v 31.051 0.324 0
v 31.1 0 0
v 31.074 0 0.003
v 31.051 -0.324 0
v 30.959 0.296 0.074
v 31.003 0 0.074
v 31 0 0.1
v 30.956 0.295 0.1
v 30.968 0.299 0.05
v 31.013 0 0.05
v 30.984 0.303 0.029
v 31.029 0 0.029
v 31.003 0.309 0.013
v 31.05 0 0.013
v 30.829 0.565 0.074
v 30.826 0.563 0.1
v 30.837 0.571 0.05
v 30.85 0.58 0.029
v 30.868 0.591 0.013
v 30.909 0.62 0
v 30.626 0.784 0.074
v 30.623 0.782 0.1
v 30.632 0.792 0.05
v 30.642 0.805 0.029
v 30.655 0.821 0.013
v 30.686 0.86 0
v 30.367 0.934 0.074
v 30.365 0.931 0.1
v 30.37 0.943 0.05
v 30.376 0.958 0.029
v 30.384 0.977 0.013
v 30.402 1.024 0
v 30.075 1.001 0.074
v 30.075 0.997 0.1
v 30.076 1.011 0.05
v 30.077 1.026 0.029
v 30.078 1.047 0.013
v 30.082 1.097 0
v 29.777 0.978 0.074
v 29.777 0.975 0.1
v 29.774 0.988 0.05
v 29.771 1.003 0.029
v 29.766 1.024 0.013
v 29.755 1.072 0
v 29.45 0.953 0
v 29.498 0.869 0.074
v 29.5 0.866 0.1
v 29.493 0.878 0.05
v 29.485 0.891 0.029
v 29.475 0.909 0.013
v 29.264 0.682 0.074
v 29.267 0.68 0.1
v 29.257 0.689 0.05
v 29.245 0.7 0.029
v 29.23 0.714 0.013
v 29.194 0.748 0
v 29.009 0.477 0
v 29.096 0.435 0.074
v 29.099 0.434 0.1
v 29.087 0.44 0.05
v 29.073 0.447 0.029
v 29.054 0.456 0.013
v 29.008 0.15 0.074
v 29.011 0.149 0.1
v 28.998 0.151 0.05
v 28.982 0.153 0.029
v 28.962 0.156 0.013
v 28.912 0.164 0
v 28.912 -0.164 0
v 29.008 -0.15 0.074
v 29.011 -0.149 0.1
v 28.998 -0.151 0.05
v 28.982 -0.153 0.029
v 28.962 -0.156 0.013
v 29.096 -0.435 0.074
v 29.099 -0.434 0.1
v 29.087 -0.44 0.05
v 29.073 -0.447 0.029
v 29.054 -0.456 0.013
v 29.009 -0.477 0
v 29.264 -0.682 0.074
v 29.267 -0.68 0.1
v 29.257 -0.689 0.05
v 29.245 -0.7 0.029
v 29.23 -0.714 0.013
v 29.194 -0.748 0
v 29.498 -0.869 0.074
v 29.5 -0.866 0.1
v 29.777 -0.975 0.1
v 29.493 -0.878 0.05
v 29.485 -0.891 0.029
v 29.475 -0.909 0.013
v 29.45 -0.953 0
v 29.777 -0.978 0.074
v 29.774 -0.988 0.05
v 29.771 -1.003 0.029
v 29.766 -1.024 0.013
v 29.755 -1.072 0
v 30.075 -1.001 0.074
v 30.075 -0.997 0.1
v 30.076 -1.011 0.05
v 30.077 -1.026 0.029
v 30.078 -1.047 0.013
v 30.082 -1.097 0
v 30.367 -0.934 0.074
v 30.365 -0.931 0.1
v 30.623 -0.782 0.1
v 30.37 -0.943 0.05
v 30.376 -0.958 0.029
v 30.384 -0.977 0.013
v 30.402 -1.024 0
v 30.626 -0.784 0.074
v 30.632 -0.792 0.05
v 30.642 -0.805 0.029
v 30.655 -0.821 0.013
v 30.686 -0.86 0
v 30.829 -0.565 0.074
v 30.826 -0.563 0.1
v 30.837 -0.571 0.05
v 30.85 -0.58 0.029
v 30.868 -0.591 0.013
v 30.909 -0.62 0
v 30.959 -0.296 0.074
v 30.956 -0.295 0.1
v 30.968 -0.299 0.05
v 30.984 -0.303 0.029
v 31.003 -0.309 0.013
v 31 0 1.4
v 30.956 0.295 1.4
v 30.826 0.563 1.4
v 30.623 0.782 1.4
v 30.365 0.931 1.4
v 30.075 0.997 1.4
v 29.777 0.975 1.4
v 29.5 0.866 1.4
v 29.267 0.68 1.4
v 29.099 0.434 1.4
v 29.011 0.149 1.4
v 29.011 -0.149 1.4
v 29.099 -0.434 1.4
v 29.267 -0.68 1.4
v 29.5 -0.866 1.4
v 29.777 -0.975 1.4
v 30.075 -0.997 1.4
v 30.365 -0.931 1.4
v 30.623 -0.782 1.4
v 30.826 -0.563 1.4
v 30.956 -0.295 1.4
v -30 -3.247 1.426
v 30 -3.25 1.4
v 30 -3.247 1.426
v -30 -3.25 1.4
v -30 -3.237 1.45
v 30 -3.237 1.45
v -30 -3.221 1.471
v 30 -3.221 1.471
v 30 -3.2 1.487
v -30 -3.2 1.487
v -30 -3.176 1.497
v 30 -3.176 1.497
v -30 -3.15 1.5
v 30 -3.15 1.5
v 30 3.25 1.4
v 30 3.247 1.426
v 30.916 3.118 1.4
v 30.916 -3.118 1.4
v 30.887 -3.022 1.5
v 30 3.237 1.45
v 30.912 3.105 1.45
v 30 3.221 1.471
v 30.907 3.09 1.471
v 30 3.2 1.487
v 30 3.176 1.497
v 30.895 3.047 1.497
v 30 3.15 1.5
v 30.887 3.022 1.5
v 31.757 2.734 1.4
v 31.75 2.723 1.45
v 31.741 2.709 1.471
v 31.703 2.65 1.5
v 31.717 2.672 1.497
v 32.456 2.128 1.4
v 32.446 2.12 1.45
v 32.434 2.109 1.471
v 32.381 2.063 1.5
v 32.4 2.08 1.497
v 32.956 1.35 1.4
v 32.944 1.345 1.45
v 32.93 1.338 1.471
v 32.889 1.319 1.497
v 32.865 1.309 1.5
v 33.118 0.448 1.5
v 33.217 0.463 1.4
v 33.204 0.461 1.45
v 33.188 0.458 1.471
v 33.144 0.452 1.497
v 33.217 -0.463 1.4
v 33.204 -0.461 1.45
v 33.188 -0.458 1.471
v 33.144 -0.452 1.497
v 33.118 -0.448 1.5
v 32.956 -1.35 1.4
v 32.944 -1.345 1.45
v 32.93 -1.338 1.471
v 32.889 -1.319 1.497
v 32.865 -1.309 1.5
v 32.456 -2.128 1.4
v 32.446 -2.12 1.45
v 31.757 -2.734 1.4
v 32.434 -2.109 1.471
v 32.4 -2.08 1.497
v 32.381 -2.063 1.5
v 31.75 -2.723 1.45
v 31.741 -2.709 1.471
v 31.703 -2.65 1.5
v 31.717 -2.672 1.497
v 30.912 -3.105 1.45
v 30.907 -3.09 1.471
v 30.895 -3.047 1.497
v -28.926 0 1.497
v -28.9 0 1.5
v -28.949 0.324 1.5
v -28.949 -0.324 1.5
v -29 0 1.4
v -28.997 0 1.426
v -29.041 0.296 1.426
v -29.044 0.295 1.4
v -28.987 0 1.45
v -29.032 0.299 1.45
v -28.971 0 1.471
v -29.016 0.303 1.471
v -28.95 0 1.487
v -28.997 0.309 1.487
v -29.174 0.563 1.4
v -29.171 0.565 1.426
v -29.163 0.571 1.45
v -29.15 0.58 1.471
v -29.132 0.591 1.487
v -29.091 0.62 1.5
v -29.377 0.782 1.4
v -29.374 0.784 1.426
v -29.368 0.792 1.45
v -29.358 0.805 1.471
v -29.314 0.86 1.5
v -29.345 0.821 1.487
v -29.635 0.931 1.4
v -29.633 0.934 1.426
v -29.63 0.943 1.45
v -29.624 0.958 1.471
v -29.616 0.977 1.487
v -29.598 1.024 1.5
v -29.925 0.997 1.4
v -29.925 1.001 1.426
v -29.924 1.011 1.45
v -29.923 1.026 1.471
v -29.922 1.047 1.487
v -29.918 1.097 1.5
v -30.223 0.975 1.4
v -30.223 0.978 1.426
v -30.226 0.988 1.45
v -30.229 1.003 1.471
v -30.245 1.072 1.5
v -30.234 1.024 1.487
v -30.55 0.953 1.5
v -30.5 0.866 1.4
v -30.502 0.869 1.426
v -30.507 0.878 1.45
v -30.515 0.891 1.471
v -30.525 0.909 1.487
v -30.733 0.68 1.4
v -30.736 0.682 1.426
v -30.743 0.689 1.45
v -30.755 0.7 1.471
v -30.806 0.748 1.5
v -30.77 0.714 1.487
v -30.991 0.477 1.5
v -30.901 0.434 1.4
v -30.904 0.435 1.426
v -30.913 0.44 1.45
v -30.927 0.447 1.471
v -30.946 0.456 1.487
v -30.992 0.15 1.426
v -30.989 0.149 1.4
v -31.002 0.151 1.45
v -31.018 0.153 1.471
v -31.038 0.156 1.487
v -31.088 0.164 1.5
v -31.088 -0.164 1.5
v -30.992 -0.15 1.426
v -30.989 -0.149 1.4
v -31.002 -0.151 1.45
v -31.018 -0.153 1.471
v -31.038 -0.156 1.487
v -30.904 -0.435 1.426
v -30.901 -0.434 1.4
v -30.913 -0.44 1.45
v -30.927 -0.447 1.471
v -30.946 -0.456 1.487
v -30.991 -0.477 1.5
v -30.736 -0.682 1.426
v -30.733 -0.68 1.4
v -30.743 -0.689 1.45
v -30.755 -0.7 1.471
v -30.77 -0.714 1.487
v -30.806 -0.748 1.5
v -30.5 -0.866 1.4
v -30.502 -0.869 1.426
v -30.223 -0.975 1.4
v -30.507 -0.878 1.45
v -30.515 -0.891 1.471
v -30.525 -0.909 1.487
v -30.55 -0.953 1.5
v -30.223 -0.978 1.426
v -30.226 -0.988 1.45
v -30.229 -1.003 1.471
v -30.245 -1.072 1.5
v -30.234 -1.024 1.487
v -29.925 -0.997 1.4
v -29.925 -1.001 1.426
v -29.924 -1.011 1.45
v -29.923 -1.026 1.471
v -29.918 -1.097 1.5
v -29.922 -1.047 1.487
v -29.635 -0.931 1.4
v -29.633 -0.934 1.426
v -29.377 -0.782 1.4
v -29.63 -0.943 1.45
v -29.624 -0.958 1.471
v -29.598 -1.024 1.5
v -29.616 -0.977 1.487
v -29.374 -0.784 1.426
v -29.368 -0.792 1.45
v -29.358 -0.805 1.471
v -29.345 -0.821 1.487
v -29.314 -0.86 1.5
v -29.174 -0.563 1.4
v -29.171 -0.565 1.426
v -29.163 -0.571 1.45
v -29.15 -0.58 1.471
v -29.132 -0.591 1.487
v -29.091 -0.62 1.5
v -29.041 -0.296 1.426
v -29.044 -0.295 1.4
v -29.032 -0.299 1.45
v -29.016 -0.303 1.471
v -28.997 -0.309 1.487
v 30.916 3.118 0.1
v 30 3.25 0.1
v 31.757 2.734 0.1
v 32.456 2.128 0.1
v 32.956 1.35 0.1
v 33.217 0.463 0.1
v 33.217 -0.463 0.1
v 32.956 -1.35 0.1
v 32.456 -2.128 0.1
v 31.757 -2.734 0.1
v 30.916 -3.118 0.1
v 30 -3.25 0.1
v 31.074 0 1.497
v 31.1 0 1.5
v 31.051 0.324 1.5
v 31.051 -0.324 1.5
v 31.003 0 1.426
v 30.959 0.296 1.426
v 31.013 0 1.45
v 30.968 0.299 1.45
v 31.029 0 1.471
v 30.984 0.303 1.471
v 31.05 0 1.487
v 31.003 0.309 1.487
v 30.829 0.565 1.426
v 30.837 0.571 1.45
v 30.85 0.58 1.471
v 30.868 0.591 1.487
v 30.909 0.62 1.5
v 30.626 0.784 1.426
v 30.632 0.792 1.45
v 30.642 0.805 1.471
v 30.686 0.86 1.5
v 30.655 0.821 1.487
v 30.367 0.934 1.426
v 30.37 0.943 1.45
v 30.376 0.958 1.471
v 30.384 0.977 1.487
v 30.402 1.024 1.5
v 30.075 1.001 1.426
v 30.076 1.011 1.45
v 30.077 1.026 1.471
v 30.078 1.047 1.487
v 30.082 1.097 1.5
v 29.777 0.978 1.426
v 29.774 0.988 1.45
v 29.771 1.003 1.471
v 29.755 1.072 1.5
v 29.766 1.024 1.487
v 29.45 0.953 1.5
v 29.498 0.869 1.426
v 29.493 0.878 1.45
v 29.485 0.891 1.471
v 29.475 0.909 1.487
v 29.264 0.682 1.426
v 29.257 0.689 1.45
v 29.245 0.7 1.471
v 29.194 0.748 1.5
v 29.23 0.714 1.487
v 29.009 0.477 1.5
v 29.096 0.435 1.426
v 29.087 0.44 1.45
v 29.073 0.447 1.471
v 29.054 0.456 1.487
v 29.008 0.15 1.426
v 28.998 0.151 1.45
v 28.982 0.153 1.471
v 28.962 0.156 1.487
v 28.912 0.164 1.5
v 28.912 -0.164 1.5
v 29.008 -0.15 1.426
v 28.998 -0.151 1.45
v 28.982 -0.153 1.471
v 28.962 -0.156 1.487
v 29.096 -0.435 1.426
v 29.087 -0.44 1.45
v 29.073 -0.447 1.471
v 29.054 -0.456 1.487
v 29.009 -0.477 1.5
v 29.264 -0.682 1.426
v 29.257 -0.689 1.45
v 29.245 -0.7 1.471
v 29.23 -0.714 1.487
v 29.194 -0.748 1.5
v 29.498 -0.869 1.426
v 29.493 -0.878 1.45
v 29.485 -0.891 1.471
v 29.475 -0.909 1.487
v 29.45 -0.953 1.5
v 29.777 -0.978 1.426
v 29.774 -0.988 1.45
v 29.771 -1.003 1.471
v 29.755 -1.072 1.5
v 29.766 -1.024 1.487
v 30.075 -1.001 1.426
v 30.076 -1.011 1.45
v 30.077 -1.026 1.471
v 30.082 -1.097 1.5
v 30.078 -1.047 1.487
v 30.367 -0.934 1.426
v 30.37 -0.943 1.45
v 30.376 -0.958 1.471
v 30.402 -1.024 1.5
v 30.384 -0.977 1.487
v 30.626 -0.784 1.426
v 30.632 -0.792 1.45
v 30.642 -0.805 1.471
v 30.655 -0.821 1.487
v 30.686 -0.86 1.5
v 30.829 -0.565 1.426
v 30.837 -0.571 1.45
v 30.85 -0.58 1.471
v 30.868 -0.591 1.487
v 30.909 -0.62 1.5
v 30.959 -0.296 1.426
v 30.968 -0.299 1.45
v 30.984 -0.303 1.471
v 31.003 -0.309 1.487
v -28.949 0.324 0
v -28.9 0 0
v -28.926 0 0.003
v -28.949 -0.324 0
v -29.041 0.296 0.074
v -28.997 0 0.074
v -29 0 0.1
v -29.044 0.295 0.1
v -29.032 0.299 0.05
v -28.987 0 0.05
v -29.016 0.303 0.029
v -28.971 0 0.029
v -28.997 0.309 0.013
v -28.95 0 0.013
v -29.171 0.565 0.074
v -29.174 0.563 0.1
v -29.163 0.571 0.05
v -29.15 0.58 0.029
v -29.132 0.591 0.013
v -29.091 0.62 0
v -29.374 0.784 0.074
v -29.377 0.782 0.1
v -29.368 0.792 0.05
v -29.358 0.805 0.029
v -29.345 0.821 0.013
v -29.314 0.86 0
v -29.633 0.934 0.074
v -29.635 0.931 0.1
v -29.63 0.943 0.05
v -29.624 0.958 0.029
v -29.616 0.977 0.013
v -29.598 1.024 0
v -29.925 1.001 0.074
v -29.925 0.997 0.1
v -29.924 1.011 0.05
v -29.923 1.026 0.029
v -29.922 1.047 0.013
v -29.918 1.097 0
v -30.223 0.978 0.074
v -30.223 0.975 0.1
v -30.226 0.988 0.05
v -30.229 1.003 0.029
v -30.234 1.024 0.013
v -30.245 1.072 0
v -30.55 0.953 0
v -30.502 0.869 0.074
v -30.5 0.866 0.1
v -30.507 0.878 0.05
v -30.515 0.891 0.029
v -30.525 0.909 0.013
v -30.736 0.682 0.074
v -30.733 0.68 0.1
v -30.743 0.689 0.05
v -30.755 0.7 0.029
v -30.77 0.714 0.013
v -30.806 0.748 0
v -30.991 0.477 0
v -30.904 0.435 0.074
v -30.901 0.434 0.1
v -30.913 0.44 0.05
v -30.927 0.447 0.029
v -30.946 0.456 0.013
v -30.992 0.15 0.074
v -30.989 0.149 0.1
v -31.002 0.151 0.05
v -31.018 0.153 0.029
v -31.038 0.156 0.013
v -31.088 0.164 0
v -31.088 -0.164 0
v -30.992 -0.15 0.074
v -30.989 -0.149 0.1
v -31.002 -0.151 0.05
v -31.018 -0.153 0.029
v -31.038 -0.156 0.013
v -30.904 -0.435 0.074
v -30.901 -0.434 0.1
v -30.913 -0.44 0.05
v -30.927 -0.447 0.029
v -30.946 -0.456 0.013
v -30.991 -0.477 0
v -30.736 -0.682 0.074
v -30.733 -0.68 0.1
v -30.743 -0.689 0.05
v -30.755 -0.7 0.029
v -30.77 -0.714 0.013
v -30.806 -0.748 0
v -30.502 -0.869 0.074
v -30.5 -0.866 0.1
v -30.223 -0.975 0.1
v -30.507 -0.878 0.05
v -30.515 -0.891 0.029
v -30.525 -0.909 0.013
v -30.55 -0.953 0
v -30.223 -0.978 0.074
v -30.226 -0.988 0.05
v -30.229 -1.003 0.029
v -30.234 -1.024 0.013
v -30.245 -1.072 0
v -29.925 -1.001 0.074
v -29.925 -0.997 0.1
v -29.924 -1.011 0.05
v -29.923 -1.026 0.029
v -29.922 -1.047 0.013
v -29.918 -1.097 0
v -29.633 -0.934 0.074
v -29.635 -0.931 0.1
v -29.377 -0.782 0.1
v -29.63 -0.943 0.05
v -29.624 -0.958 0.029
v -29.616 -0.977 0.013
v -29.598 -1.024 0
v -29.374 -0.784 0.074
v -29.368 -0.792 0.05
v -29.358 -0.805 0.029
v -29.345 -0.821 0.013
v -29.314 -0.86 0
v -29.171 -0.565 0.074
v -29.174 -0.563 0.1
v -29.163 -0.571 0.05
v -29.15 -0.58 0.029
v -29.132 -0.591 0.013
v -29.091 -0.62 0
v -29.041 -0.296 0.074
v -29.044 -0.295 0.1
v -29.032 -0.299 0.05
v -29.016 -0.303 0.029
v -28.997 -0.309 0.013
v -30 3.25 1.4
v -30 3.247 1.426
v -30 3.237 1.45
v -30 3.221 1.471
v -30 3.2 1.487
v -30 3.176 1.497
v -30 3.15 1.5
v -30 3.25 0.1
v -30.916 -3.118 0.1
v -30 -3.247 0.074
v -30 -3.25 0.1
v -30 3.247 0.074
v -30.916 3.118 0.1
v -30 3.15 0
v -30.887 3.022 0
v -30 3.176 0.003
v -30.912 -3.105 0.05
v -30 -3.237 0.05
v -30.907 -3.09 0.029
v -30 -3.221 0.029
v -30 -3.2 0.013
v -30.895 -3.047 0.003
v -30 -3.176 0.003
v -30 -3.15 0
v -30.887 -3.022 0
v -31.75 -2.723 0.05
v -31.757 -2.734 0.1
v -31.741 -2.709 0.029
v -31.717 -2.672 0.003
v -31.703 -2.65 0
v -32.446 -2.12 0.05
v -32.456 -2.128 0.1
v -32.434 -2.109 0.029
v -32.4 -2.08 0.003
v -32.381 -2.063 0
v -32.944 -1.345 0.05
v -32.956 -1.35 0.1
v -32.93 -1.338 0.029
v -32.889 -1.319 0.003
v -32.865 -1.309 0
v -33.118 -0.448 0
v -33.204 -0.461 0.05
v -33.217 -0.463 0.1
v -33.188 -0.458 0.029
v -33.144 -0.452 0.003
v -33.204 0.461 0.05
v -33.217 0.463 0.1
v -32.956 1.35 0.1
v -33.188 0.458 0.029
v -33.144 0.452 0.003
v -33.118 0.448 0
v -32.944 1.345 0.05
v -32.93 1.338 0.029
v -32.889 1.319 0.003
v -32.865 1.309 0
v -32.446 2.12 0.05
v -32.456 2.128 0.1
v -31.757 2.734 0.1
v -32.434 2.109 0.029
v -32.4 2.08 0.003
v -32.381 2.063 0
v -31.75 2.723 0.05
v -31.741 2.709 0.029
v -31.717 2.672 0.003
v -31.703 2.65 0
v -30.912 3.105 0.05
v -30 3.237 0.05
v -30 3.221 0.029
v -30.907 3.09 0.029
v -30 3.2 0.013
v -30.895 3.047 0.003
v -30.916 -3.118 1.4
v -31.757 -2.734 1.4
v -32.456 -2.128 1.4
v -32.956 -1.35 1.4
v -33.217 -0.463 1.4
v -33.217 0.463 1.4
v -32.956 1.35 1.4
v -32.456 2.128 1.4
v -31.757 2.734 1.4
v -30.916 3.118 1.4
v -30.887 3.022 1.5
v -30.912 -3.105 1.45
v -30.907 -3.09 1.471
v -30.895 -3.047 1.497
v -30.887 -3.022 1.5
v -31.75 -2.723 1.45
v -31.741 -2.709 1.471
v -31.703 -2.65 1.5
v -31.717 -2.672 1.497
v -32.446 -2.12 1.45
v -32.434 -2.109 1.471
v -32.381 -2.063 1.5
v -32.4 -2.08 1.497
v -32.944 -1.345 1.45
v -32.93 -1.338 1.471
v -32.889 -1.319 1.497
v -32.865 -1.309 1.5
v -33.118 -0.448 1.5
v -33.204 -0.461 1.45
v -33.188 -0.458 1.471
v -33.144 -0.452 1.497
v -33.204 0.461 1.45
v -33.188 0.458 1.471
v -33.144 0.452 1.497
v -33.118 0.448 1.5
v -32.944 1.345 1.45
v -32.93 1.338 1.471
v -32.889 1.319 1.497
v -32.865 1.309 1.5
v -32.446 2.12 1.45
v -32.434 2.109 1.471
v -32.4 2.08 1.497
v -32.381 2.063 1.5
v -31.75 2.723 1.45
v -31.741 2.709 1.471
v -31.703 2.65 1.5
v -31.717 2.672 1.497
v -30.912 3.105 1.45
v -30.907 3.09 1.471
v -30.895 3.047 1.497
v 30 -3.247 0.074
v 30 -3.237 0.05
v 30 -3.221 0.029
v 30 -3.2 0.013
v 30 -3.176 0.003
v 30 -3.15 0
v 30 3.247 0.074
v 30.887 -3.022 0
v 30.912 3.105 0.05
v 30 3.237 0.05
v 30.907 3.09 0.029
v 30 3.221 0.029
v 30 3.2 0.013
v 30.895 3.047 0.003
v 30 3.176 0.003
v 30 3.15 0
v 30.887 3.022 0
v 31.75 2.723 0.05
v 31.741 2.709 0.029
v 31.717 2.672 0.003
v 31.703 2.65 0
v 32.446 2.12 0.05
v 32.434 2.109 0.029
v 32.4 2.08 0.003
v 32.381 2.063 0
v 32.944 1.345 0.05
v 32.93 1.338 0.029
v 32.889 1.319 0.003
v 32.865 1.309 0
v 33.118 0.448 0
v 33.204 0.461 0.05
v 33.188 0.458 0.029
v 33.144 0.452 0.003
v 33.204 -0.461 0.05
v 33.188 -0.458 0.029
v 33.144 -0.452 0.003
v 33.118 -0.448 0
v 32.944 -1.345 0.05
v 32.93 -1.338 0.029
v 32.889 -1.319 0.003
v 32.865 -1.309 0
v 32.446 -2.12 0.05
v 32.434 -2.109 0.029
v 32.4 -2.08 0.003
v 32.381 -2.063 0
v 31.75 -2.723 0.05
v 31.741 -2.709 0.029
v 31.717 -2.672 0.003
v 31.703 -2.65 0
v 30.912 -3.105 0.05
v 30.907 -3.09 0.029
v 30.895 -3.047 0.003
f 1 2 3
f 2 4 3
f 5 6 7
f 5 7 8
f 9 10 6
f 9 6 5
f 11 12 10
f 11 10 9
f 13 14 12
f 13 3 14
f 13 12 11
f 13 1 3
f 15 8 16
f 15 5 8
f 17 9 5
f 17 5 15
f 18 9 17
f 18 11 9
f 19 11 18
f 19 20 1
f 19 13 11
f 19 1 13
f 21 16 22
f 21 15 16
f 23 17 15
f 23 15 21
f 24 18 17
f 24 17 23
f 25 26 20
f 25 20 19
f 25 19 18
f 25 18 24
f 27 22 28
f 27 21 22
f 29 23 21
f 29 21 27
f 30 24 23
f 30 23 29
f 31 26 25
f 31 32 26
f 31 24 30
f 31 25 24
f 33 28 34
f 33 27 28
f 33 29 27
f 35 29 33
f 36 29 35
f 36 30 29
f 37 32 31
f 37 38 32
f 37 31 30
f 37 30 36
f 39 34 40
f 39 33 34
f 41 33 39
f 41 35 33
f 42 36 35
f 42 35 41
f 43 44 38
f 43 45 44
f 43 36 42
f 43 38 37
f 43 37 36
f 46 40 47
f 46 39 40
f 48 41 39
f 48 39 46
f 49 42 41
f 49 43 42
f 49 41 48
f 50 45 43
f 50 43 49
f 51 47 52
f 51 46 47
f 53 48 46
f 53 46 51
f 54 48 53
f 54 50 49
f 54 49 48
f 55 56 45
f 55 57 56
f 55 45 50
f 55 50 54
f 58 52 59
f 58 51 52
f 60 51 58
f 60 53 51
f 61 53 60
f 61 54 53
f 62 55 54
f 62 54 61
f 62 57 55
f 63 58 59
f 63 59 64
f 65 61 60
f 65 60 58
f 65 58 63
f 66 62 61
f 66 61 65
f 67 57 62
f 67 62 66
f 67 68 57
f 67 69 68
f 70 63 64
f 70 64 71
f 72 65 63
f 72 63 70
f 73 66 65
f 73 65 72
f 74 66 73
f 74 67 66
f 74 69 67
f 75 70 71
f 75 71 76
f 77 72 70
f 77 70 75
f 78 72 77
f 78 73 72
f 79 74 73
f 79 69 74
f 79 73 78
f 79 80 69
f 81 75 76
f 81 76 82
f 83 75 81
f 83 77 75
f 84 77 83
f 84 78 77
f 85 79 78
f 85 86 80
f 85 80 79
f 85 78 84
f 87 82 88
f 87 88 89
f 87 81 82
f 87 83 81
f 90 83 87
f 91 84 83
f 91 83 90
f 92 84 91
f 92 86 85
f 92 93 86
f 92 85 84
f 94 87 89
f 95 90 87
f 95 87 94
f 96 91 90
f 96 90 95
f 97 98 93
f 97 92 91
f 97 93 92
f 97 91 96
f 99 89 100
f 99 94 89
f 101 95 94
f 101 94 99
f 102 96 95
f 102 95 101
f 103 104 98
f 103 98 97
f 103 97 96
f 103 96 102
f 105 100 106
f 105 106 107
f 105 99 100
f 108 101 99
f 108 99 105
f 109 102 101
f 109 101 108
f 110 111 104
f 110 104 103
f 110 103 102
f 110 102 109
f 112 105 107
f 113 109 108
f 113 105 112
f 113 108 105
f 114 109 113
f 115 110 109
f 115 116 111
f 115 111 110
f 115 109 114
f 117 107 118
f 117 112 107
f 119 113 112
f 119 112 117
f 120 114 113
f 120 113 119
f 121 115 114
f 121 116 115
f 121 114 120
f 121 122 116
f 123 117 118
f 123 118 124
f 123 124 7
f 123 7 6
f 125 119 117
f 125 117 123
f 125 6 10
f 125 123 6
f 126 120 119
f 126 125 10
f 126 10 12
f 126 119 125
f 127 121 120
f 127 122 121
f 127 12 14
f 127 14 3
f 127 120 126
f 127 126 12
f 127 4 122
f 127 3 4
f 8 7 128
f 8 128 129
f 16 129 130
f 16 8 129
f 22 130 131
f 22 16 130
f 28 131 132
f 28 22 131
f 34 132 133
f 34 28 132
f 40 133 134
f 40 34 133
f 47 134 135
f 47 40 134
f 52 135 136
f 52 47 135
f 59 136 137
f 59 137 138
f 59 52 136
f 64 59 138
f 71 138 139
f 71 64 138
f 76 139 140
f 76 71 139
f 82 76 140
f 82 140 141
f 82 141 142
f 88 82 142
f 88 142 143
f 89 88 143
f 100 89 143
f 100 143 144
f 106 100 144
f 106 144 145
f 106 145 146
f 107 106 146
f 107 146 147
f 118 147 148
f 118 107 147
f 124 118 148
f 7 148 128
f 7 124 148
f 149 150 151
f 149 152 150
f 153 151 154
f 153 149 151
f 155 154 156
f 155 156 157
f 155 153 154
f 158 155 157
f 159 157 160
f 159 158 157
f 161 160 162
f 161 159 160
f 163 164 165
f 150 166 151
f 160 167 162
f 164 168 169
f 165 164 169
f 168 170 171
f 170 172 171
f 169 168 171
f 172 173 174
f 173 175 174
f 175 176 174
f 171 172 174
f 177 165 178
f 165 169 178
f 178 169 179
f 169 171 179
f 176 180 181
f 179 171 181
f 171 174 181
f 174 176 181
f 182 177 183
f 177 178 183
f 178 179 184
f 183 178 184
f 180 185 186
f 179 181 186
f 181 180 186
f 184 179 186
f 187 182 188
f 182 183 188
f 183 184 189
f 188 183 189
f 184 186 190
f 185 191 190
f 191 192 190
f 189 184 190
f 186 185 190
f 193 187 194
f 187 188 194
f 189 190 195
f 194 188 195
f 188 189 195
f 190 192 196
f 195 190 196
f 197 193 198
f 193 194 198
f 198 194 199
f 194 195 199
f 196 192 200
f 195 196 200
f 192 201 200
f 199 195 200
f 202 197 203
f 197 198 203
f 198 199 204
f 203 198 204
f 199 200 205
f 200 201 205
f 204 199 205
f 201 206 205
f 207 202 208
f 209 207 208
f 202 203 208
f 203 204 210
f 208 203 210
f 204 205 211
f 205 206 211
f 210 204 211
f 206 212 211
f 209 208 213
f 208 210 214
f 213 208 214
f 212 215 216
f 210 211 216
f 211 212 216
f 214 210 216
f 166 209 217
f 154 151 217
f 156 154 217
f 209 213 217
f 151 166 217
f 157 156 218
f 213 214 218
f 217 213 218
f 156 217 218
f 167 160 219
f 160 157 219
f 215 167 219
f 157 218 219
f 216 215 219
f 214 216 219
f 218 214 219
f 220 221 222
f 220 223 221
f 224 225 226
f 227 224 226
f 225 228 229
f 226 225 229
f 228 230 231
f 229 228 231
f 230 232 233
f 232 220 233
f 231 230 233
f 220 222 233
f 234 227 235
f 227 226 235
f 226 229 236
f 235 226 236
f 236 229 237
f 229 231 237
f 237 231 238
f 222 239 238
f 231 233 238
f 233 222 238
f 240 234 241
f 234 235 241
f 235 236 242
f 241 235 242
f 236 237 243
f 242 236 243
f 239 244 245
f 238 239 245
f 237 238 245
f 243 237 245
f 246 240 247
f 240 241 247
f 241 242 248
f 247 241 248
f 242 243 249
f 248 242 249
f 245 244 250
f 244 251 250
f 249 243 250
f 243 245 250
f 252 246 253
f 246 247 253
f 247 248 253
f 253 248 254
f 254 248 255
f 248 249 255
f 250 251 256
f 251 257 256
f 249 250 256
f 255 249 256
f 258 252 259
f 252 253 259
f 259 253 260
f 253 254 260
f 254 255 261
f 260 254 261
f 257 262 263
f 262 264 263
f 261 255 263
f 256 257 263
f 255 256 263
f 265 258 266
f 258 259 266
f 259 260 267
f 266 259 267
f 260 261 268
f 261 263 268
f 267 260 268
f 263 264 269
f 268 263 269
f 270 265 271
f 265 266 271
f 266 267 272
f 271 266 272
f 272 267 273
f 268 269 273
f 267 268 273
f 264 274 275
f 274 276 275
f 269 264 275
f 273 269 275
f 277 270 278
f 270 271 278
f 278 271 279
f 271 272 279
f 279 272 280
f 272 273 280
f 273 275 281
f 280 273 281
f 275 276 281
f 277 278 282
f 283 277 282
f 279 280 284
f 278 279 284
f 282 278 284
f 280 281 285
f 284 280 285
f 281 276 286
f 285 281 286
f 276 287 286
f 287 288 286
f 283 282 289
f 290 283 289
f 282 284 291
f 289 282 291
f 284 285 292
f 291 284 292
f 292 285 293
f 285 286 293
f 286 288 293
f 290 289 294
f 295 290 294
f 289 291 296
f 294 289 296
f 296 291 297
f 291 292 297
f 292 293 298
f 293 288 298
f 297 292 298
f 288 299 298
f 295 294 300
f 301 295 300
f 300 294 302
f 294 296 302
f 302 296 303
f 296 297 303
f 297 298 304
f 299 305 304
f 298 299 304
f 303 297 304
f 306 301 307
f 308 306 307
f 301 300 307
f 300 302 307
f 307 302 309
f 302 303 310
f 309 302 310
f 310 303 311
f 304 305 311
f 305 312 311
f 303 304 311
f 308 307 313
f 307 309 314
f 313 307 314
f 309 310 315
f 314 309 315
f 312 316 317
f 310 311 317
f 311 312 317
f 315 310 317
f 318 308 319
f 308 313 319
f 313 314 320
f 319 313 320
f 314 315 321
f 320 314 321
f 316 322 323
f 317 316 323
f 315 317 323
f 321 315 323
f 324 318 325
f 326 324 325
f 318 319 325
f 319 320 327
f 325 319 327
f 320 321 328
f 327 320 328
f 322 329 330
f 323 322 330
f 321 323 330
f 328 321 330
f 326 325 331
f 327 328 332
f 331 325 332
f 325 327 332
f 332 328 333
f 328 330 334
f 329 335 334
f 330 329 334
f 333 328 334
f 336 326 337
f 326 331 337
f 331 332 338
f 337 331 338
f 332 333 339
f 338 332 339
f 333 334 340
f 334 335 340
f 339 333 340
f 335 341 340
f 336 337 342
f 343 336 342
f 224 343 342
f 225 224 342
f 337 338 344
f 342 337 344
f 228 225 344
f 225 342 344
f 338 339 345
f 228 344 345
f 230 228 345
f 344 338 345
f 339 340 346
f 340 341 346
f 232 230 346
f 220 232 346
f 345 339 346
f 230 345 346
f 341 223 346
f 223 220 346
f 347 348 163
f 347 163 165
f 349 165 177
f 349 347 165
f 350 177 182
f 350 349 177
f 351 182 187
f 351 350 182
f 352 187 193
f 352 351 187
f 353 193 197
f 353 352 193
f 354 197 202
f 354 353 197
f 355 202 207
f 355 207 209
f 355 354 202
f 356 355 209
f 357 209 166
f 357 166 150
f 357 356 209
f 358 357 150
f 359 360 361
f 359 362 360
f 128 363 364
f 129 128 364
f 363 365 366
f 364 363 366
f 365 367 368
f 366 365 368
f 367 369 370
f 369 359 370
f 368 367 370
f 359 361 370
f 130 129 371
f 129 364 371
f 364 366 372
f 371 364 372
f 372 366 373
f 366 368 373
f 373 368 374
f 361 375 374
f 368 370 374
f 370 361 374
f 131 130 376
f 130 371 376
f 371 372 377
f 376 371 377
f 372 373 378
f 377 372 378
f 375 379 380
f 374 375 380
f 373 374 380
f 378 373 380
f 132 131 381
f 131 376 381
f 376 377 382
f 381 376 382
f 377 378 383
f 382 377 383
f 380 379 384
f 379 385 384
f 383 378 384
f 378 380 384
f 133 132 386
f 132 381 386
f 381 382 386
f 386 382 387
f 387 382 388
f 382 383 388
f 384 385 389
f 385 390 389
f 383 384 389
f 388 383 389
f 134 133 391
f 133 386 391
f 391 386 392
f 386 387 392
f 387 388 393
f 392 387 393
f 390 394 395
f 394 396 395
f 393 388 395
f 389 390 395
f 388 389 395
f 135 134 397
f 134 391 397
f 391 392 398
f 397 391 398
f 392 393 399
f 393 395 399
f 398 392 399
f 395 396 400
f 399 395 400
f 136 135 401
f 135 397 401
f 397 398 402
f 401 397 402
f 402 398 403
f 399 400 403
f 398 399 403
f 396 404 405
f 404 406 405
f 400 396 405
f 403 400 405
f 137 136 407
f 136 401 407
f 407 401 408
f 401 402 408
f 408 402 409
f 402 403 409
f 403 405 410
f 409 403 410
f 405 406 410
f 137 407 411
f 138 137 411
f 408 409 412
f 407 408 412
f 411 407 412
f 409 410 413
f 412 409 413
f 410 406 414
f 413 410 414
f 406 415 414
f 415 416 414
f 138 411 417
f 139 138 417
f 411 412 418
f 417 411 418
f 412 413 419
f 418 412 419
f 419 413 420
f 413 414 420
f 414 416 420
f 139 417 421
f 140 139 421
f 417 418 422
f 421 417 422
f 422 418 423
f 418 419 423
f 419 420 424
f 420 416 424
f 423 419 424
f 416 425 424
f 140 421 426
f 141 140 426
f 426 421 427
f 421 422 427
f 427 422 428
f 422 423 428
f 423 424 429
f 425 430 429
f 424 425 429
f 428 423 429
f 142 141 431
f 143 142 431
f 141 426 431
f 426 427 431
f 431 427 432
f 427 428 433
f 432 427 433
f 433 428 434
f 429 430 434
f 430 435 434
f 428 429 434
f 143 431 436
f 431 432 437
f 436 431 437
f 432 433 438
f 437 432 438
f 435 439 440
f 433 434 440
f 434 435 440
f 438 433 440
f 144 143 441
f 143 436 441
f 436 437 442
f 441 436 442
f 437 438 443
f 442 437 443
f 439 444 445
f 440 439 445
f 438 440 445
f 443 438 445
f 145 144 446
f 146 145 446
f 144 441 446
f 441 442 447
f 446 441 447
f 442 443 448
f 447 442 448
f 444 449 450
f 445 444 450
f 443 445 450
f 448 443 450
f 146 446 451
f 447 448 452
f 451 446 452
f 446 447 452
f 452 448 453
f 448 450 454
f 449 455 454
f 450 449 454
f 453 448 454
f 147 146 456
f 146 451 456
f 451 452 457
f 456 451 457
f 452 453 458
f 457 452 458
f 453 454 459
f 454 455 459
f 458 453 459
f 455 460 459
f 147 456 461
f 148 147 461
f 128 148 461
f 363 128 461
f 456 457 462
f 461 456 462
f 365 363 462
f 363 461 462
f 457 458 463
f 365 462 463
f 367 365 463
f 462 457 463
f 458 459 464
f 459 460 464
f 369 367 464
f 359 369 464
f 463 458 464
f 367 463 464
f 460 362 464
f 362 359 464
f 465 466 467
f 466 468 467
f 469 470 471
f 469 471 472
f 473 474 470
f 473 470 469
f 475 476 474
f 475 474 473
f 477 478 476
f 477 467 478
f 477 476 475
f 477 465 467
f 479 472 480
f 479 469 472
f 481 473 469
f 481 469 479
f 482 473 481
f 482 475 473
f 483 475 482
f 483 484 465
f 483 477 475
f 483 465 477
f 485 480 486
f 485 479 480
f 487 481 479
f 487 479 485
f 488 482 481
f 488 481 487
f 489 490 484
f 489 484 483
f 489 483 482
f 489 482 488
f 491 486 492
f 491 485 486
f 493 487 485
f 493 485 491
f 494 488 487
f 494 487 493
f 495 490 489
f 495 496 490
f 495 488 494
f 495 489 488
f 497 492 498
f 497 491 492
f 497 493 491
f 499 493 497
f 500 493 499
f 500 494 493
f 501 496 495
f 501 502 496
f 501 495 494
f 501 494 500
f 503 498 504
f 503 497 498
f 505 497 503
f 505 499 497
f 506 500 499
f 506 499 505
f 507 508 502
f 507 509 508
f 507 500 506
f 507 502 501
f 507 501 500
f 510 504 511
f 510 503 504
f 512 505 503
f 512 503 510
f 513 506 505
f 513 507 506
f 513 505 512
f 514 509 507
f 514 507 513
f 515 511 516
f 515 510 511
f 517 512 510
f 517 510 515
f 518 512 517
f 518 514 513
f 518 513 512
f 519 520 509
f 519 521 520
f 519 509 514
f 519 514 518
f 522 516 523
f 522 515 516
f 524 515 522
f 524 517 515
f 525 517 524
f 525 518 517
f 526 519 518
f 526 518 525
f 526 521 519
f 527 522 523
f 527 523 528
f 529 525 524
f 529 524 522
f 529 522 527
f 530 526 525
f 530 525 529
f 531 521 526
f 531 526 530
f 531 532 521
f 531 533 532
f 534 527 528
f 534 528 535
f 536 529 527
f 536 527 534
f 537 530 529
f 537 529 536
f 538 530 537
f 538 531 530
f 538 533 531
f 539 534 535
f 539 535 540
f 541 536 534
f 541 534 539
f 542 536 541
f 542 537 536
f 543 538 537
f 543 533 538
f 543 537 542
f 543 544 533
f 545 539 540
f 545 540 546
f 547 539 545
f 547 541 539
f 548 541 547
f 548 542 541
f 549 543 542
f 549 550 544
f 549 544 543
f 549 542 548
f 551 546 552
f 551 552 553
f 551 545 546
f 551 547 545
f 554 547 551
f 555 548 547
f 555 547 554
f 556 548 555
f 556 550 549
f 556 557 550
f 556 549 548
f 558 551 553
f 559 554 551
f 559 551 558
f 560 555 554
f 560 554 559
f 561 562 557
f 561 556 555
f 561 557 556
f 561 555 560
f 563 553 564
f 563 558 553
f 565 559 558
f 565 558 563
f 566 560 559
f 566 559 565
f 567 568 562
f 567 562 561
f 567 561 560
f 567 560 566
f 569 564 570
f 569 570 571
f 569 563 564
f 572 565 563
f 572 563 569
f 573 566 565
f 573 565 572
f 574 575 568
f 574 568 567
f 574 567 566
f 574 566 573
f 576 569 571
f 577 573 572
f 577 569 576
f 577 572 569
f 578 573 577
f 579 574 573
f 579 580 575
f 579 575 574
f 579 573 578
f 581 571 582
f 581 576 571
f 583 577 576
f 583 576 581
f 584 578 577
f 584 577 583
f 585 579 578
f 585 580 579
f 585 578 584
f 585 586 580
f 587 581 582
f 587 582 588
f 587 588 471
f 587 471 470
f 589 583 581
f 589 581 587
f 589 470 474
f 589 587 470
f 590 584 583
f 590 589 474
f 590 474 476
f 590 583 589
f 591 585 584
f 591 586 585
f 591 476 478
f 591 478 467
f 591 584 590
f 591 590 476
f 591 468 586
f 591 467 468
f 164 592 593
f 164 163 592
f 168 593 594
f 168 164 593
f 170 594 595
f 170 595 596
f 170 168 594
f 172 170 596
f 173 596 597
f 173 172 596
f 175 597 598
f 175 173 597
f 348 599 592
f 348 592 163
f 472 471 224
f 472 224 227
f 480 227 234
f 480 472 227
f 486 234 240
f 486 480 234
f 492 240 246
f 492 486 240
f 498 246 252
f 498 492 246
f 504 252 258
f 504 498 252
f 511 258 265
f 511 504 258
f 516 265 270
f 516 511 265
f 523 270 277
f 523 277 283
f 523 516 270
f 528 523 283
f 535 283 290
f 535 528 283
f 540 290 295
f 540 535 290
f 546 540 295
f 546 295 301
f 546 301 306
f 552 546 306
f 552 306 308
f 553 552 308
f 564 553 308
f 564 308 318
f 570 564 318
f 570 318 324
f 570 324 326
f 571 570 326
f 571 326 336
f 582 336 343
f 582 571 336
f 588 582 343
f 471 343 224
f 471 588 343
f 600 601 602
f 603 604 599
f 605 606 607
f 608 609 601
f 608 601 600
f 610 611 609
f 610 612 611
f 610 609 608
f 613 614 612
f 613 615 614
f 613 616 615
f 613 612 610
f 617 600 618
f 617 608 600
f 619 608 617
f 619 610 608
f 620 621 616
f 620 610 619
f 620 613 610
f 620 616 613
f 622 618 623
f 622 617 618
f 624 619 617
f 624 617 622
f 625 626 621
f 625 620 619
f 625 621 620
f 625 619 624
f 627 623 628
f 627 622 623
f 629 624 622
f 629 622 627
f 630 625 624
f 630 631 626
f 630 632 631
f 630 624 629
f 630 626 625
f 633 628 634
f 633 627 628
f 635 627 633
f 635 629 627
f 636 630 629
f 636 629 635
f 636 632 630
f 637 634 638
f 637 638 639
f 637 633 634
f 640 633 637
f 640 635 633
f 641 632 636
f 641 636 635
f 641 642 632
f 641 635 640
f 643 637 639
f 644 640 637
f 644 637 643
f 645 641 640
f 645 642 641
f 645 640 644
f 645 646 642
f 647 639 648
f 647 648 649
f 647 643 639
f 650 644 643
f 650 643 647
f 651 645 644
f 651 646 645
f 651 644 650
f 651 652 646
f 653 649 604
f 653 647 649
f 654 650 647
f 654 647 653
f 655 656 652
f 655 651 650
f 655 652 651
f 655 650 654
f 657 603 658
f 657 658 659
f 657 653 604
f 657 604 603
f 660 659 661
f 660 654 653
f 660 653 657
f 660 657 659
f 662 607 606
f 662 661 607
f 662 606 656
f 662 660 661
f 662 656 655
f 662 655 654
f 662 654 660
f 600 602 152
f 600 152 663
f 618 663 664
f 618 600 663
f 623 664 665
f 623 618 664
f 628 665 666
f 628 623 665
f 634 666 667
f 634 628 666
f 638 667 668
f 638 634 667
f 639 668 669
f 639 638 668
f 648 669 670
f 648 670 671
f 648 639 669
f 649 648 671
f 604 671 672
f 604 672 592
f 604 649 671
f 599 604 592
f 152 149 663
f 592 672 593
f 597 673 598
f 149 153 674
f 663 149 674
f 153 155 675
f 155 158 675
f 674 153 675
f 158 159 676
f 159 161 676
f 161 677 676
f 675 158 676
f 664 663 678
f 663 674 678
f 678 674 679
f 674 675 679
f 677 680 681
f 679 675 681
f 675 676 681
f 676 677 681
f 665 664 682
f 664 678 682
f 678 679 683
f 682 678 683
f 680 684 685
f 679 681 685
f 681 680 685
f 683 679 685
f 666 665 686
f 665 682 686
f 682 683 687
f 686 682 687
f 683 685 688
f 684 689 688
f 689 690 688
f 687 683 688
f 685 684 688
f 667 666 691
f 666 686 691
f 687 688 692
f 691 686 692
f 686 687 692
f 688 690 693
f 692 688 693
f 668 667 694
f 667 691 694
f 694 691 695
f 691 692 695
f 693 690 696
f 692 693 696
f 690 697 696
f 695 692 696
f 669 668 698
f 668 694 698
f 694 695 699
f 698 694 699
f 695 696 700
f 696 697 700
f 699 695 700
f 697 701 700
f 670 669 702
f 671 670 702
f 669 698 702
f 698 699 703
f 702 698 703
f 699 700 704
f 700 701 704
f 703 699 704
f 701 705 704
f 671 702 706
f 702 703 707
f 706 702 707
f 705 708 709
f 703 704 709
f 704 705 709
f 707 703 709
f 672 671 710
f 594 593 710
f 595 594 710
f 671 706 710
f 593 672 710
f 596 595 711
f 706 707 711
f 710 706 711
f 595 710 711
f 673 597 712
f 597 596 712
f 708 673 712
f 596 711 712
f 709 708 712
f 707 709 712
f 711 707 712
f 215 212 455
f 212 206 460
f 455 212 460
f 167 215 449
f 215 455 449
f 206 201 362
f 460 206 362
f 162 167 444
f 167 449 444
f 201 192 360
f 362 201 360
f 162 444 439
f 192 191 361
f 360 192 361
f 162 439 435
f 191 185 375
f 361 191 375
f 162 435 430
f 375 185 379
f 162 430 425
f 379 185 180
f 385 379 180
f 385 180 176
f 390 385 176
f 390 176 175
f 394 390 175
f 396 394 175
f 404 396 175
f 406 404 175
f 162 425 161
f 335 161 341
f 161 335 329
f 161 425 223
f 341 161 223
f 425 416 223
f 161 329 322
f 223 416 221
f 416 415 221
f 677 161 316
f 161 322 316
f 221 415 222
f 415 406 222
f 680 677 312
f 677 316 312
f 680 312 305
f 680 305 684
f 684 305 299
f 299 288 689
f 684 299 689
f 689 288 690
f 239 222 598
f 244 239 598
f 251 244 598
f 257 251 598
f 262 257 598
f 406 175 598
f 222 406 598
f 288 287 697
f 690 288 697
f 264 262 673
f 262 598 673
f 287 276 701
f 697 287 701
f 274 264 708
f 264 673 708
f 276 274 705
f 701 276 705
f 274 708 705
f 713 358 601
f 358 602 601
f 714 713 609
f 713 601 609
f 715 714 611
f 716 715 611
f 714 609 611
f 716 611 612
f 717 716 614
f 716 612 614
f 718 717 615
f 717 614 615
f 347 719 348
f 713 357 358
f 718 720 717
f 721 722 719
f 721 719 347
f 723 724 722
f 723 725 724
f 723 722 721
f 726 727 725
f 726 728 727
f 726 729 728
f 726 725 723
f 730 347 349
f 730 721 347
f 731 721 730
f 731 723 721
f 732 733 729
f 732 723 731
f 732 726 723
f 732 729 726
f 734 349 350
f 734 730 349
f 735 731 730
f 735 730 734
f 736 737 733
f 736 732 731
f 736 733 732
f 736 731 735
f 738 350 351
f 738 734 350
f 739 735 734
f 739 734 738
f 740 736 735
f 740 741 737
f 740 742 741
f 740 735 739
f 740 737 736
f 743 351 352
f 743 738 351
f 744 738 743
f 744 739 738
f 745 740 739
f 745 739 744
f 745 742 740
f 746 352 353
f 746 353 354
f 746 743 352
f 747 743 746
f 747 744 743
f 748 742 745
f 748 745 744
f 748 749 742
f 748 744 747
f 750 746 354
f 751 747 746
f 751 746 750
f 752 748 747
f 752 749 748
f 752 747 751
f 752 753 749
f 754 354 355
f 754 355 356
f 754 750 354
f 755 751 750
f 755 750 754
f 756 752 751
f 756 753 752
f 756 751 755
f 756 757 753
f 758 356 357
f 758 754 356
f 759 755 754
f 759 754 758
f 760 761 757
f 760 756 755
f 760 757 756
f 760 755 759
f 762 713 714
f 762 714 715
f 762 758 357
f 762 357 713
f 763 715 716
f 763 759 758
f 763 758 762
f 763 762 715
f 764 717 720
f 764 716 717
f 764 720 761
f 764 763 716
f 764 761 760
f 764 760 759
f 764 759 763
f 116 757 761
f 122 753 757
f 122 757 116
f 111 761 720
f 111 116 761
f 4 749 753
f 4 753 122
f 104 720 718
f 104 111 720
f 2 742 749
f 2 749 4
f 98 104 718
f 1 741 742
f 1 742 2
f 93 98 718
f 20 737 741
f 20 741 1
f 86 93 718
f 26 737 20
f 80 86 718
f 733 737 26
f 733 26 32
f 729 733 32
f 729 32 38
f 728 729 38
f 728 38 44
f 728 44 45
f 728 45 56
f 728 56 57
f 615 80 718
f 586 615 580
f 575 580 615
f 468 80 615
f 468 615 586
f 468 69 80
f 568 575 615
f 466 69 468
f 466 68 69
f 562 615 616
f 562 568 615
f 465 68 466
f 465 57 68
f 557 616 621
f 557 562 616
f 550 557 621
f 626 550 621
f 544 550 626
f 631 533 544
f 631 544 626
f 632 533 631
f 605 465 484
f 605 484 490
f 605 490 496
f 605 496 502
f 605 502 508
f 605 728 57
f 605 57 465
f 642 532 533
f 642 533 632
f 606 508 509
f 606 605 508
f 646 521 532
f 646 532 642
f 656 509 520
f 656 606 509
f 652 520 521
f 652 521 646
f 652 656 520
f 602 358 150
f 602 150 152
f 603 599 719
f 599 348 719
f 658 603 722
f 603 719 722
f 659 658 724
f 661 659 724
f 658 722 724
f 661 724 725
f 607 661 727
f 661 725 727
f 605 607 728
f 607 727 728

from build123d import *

# Parameters (mm, degrees)
SKETCH1_R           = 1
BOSS_EXTRUDE1_DEPTH = 1.5
FILLET1_R           = 0.1


with BuildPart() as part:
    # Sketch1 → Boss-Extrude1 (new body)
    with BuildSketch(Plane.XY):
        with BuildLine():
            Line((-30, 3.25), (30, 3.25))
            ThreePointArc((30, 3.25), (33.25, 0), (30, -3.25))
            Line((30, -3.25), (-30, -3.25))
            ThreePointArc((-30, -3.25), (-33.25, 0), (-30, 3.25))
        make_face()
        with Locations((-30, 0)):
            Circle(SKETCH1_R, mode=Mode.SUBTRACT)
        with Locations((30, 0)):
            Circle(SKETCH1_R, mode=Mode.SUBTRACT)
    extrude(amount=BOSS_EXTRUDE1_DEPTH)

    # Fillet1
    fillet1_edges = [part.edges().sort_by_distance(p)[0] for p in [
        (33.25, 0, 1.5),
        (-31, 0, 0),
        (-31, 0, 1.5),
        (0, 3.25, 1.5),
        (29, 0, 0),
        (29, 0, 1.5),
        (-33.25, 0, 1.5),
        (0, 3.25, 0),
        (33.25, 0, 0),
        (0, -3.25, 0),
        (-33.25, 0, 0),
        (0, -3.25, 1.5),
    ]]
    fillet(fillet1_edges, radius=FILLET1_R)


solid = part.part
